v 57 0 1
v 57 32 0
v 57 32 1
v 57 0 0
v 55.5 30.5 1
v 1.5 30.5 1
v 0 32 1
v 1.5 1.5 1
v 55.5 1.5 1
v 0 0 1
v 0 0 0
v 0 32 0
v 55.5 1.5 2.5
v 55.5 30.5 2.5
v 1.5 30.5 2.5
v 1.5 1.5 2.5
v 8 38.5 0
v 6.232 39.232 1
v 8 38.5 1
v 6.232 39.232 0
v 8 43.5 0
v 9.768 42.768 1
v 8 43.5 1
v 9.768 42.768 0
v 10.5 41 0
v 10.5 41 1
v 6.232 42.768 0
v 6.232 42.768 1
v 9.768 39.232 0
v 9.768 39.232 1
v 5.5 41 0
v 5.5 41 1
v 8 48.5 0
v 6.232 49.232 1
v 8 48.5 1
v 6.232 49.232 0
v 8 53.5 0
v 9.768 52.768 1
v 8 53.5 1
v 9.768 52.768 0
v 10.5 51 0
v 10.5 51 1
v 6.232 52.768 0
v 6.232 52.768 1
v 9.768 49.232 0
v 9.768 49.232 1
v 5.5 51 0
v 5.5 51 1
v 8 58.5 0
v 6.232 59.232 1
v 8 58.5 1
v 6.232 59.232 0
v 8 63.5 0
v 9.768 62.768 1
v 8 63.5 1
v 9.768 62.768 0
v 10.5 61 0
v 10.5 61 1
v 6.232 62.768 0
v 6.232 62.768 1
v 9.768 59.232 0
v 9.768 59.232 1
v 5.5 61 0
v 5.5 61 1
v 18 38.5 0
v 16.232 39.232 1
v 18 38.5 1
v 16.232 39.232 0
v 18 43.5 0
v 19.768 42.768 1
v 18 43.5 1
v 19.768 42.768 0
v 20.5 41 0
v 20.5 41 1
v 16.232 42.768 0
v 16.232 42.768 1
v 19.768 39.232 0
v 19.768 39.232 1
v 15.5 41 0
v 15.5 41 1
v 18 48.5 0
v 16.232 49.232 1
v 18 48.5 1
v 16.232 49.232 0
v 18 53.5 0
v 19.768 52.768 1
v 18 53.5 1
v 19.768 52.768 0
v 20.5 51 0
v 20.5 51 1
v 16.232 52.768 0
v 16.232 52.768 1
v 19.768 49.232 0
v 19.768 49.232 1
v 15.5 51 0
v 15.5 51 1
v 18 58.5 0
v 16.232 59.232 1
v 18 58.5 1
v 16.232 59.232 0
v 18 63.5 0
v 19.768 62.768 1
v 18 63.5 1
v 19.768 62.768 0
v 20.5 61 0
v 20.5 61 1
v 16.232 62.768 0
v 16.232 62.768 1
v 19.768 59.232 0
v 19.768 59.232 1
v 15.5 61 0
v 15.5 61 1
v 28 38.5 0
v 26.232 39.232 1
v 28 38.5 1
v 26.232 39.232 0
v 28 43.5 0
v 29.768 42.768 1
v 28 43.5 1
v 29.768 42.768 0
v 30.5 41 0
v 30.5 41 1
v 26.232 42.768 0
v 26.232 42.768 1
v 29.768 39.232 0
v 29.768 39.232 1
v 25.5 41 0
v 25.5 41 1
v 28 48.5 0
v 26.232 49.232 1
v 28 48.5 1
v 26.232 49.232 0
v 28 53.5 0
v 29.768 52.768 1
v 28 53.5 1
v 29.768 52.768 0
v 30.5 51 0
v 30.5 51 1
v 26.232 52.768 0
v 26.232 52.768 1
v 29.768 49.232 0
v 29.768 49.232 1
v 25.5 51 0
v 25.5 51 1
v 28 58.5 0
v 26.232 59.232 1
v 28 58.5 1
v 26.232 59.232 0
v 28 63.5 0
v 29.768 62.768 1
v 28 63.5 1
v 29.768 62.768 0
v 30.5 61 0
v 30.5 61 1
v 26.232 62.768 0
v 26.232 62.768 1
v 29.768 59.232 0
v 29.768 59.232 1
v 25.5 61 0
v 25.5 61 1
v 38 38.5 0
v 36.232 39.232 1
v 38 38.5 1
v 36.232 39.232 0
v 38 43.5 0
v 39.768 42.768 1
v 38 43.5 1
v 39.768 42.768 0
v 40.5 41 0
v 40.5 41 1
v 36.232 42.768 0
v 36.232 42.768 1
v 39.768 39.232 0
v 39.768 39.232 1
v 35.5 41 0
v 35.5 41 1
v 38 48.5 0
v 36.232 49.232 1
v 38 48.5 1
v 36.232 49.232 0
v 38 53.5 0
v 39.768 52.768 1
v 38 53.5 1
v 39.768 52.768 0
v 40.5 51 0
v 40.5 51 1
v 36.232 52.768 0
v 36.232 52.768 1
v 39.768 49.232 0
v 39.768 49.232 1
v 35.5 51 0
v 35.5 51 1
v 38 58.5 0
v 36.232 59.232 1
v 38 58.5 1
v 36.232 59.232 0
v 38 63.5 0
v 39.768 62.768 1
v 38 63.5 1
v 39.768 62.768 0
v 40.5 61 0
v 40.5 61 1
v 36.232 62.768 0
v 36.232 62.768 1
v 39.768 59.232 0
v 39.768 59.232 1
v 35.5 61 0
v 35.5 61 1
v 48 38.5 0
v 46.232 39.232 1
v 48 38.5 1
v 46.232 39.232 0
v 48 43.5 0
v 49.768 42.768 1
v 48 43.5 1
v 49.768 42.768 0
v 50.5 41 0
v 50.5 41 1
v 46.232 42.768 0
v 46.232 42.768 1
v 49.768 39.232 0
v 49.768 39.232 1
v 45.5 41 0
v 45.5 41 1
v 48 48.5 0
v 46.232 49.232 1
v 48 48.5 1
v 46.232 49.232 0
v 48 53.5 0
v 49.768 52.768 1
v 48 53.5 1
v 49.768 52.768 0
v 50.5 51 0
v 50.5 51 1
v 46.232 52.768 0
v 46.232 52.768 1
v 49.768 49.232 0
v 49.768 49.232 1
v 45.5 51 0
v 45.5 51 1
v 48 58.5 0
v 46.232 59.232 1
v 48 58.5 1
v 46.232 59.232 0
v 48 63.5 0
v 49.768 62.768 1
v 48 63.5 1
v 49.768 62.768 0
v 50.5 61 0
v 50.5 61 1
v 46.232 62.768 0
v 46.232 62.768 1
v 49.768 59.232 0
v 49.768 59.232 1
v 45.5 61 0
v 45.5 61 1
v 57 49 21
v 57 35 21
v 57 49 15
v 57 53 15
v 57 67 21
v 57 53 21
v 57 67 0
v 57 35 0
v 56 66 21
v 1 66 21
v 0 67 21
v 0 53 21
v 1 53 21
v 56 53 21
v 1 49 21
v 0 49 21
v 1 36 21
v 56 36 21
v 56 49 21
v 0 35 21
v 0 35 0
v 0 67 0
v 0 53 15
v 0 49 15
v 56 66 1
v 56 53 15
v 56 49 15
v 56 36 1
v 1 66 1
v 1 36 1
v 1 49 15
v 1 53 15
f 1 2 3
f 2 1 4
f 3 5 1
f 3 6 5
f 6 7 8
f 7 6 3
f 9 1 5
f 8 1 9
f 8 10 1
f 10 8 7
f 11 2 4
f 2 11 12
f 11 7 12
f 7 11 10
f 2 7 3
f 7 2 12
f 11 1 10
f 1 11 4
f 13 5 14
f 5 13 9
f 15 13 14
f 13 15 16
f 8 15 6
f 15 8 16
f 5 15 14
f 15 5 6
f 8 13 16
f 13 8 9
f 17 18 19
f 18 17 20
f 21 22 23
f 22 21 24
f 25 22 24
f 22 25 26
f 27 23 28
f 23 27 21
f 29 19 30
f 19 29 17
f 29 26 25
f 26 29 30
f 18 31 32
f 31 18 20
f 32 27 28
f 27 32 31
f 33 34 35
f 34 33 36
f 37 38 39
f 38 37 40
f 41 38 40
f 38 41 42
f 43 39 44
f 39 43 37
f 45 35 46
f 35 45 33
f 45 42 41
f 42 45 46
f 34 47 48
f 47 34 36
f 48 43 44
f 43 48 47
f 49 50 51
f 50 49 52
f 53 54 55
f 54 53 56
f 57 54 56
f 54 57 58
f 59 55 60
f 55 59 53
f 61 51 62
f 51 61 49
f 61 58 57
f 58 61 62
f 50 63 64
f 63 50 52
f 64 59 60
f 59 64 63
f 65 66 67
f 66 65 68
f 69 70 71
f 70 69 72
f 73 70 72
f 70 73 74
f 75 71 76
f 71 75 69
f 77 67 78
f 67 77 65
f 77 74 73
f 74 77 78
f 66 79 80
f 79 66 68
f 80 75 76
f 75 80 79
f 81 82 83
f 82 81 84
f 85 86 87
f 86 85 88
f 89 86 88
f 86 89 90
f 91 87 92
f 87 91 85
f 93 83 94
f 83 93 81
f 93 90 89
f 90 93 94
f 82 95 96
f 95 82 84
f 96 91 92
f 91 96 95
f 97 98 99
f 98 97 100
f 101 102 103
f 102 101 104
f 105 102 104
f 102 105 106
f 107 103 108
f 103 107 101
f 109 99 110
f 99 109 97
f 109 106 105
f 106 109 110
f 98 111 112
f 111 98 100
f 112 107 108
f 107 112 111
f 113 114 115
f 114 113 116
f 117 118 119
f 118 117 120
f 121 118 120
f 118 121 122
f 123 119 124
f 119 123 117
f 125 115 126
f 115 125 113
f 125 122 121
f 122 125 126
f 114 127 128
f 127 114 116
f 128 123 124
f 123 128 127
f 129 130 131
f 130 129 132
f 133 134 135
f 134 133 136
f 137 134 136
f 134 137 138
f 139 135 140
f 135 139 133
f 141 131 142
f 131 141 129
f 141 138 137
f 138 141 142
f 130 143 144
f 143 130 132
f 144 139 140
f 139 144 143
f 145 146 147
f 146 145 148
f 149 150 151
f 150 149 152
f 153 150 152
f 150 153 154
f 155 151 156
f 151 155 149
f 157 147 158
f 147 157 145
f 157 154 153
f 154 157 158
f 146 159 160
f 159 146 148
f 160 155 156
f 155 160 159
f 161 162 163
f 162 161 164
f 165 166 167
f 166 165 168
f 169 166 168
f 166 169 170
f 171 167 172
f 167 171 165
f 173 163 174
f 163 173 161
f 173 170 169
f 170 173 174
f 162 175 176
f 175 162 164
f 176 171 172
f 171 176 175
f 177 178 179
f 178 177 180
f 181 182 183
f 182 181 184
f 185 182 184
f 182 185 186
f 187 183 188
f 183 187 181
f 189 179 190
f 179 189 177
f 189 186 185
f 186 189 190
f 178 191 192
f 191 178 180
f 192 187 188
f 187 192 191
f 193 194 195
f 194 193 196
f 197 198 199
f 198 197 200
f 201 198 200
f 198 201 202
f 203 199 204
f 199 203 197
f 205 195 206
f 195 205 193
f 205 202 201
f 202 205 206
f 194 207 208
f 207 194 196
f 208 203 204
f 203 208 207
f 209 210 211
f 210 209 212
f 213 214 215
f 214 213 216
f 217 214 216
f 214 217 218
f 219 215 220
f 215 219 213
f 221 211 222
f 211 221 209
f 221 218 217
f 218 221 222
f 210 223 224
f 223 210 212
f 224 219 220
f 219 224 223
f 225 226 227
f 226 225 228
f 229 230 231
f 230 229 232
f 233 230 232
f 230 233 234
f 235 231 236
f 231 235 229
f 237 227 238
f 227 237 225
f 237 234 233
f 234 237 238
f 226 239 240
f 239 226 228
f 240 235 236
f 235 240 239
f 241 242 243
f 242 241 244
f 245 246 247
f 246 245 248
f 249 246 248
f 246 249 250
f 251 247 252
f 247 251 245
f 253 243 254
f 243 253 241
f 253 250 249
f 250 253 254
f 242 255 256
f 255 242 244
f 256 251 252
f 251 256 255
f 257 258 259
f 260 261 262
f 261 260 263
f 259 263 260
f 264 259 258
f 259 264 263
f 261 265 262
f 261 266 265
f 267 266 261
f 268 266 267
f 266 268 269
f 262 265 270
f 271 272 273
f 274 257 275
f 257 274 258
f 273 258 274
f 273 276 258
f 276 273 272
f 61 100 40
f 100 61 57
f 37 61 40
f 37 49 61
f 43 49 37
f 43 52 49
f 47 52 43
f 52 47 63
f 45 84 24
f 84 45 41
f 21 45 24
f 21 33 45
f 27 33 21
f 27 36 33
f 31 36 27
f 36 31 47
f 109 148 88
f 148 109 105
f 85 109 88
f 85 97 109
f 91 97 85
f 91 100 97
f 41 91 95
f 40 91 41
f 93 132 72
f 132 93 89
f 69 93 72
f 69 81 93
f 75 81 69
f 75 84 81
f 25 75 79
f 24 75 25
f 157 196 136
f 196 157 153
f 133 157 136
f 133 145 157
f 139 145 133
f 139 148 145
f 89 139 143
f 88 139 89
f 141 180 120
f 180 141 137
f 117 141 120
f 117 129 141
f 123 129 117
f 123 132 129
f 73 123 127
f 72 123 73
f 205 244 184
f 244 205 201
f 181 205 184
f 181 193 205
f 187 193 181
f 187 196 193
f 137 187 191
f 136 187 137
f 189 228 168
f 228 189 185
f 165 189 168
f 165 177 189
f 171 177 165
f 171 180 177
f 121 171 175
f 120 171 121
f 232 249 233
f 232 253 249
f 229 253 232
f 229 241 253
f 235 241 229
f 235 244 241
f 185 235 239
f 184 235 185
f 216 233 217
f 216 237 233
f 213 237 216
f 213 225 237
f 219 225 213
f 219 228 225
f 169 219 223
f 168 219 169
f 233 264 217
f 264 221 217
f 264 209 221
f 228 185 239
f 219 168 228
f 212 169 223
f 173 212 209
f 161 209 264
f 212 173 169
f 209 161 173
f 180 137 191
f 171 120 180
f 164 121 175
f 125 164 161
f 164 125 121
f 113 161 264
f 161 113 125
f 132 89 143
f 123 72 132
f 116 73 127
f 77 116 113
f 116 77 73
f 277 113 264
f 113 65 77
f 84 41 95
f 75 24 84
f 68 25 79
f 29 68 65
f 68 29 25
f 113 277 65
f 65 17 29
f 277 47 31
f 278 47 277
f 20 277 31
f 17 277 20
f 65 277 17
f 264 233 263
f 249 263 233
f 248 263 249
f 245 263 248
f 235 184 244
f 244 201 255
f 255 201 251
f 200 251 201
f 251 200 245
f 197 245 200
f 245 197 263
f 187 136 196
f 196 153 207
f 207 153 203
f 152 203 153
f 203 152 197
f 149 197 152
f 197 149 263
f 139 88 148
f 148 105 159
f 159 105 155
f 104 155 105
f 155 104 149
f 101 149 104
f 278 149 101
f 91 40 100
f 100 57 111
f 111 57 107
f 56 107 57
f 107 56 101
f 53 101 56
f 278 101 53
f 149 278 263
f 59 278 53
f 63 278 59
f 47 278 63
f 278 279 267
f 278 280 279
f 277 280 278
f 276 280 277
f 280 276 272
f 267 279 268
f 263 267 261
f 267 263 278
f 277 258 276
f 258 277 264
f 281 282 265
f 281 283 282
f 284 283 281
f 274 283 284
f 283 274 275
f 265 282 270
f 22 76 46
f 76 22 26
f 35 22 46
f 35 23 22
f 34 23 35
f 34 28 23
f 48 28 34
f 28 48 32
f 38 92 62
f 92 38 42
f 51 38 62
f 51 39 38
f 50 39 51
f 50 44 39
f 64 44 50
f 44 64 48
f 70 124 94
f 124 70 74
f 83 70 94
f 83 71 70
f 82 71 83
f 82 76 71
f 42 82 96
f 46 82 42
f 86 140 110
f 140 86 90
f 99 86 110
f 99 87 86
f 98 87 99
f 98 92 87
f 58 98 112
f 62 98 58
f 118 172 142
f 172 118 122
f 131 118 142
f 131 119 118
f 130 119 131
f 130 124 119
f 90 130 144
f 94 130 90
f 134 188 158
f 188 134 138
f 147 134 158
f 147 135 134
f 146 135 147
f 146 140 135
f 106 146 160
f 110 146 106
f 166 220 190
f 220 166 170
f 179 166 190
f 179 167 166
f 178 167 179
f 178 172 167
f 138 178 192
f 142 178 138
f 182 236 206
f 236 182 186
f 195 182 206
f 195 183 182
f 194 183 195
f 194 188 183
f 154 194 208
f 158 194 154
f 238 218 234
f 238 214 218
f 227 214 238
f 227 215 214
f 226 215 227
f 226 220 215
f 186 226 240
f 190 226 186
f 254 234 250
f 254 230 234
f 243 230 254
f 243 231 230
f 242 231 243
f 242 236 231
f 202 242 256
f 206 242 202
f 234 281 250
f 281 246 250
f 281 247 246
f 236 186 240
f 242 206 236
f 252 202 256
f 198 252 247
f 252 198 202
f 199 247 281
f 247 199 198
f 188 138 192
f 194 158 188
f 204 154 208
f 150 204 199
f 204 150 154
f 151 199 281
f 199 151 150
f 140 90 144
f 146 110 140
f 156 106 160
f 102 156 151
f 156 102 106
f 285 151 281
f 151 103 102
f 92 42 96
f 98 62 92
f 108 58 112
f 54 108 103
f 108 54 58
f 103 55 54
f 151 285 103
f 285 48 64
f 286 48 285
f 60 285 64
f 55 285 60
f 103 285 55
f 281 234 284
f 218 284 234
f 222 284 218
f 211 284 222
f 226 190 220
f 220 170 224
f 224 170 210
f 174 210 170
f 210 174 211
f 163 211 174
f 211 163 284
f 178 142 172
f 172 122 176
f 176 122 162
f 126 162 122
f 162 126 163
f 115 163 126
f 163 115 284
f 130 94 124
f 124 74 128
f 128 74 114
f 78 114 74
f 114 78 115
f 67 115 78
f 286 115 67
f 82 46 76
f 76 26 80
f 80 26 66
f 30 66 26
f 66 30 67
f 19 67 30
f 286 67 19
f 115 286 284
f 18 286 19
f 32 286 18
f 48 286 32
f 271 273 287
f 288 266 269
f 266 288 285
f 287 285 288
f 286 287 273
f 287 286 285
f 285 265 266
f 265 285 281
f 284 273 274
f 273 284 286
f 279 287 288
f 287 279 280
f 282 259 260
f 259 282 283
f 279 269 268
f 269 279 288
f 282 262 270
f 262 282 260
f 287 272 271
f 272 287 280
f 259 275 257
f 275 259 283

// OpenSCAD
eps = 0.01;
int_size = [55, 30, 20];
wall = 1;
ext_size = int_size + wall * [2,2,2];


module top()
{
  w = wall + 0.5;
  cube([ext_size[0], ext_size[1], wall]);
  translate(w*[1,1,0])
    cube([ext_size[0]-2*w, ext_size[1]-2*w, wall+w]);
}


module bottom()
{
  difference()
  {
    cube(ext_size - [0,0,wall]);
    // inner cut
    translate(wall*[1,1,1])
      cube(int_size + [0,0,eps]);
    // ventilation holes
    {
      d = 5;
      for(ix=[0:2*d:int_size[0]-2*d])
        for(iy=[0:2*d:int_size[1]-d])
          translate((wall+d)*[1,1,0] + [2,0,0] + [ix, iy, -eps])
            cylinder(d=d, h=3*wall);
    }
    // cable holes
    {
      h = wall*2+5;
      translate([-eps, ext_size[1]/2-4/2, ext_size[2]-h])
        cube([ext_size[0]+2*eps, 4, h]);
    }
  }
}


top();

translate([0, ext_size[1]+3, 0])
  bottom();
